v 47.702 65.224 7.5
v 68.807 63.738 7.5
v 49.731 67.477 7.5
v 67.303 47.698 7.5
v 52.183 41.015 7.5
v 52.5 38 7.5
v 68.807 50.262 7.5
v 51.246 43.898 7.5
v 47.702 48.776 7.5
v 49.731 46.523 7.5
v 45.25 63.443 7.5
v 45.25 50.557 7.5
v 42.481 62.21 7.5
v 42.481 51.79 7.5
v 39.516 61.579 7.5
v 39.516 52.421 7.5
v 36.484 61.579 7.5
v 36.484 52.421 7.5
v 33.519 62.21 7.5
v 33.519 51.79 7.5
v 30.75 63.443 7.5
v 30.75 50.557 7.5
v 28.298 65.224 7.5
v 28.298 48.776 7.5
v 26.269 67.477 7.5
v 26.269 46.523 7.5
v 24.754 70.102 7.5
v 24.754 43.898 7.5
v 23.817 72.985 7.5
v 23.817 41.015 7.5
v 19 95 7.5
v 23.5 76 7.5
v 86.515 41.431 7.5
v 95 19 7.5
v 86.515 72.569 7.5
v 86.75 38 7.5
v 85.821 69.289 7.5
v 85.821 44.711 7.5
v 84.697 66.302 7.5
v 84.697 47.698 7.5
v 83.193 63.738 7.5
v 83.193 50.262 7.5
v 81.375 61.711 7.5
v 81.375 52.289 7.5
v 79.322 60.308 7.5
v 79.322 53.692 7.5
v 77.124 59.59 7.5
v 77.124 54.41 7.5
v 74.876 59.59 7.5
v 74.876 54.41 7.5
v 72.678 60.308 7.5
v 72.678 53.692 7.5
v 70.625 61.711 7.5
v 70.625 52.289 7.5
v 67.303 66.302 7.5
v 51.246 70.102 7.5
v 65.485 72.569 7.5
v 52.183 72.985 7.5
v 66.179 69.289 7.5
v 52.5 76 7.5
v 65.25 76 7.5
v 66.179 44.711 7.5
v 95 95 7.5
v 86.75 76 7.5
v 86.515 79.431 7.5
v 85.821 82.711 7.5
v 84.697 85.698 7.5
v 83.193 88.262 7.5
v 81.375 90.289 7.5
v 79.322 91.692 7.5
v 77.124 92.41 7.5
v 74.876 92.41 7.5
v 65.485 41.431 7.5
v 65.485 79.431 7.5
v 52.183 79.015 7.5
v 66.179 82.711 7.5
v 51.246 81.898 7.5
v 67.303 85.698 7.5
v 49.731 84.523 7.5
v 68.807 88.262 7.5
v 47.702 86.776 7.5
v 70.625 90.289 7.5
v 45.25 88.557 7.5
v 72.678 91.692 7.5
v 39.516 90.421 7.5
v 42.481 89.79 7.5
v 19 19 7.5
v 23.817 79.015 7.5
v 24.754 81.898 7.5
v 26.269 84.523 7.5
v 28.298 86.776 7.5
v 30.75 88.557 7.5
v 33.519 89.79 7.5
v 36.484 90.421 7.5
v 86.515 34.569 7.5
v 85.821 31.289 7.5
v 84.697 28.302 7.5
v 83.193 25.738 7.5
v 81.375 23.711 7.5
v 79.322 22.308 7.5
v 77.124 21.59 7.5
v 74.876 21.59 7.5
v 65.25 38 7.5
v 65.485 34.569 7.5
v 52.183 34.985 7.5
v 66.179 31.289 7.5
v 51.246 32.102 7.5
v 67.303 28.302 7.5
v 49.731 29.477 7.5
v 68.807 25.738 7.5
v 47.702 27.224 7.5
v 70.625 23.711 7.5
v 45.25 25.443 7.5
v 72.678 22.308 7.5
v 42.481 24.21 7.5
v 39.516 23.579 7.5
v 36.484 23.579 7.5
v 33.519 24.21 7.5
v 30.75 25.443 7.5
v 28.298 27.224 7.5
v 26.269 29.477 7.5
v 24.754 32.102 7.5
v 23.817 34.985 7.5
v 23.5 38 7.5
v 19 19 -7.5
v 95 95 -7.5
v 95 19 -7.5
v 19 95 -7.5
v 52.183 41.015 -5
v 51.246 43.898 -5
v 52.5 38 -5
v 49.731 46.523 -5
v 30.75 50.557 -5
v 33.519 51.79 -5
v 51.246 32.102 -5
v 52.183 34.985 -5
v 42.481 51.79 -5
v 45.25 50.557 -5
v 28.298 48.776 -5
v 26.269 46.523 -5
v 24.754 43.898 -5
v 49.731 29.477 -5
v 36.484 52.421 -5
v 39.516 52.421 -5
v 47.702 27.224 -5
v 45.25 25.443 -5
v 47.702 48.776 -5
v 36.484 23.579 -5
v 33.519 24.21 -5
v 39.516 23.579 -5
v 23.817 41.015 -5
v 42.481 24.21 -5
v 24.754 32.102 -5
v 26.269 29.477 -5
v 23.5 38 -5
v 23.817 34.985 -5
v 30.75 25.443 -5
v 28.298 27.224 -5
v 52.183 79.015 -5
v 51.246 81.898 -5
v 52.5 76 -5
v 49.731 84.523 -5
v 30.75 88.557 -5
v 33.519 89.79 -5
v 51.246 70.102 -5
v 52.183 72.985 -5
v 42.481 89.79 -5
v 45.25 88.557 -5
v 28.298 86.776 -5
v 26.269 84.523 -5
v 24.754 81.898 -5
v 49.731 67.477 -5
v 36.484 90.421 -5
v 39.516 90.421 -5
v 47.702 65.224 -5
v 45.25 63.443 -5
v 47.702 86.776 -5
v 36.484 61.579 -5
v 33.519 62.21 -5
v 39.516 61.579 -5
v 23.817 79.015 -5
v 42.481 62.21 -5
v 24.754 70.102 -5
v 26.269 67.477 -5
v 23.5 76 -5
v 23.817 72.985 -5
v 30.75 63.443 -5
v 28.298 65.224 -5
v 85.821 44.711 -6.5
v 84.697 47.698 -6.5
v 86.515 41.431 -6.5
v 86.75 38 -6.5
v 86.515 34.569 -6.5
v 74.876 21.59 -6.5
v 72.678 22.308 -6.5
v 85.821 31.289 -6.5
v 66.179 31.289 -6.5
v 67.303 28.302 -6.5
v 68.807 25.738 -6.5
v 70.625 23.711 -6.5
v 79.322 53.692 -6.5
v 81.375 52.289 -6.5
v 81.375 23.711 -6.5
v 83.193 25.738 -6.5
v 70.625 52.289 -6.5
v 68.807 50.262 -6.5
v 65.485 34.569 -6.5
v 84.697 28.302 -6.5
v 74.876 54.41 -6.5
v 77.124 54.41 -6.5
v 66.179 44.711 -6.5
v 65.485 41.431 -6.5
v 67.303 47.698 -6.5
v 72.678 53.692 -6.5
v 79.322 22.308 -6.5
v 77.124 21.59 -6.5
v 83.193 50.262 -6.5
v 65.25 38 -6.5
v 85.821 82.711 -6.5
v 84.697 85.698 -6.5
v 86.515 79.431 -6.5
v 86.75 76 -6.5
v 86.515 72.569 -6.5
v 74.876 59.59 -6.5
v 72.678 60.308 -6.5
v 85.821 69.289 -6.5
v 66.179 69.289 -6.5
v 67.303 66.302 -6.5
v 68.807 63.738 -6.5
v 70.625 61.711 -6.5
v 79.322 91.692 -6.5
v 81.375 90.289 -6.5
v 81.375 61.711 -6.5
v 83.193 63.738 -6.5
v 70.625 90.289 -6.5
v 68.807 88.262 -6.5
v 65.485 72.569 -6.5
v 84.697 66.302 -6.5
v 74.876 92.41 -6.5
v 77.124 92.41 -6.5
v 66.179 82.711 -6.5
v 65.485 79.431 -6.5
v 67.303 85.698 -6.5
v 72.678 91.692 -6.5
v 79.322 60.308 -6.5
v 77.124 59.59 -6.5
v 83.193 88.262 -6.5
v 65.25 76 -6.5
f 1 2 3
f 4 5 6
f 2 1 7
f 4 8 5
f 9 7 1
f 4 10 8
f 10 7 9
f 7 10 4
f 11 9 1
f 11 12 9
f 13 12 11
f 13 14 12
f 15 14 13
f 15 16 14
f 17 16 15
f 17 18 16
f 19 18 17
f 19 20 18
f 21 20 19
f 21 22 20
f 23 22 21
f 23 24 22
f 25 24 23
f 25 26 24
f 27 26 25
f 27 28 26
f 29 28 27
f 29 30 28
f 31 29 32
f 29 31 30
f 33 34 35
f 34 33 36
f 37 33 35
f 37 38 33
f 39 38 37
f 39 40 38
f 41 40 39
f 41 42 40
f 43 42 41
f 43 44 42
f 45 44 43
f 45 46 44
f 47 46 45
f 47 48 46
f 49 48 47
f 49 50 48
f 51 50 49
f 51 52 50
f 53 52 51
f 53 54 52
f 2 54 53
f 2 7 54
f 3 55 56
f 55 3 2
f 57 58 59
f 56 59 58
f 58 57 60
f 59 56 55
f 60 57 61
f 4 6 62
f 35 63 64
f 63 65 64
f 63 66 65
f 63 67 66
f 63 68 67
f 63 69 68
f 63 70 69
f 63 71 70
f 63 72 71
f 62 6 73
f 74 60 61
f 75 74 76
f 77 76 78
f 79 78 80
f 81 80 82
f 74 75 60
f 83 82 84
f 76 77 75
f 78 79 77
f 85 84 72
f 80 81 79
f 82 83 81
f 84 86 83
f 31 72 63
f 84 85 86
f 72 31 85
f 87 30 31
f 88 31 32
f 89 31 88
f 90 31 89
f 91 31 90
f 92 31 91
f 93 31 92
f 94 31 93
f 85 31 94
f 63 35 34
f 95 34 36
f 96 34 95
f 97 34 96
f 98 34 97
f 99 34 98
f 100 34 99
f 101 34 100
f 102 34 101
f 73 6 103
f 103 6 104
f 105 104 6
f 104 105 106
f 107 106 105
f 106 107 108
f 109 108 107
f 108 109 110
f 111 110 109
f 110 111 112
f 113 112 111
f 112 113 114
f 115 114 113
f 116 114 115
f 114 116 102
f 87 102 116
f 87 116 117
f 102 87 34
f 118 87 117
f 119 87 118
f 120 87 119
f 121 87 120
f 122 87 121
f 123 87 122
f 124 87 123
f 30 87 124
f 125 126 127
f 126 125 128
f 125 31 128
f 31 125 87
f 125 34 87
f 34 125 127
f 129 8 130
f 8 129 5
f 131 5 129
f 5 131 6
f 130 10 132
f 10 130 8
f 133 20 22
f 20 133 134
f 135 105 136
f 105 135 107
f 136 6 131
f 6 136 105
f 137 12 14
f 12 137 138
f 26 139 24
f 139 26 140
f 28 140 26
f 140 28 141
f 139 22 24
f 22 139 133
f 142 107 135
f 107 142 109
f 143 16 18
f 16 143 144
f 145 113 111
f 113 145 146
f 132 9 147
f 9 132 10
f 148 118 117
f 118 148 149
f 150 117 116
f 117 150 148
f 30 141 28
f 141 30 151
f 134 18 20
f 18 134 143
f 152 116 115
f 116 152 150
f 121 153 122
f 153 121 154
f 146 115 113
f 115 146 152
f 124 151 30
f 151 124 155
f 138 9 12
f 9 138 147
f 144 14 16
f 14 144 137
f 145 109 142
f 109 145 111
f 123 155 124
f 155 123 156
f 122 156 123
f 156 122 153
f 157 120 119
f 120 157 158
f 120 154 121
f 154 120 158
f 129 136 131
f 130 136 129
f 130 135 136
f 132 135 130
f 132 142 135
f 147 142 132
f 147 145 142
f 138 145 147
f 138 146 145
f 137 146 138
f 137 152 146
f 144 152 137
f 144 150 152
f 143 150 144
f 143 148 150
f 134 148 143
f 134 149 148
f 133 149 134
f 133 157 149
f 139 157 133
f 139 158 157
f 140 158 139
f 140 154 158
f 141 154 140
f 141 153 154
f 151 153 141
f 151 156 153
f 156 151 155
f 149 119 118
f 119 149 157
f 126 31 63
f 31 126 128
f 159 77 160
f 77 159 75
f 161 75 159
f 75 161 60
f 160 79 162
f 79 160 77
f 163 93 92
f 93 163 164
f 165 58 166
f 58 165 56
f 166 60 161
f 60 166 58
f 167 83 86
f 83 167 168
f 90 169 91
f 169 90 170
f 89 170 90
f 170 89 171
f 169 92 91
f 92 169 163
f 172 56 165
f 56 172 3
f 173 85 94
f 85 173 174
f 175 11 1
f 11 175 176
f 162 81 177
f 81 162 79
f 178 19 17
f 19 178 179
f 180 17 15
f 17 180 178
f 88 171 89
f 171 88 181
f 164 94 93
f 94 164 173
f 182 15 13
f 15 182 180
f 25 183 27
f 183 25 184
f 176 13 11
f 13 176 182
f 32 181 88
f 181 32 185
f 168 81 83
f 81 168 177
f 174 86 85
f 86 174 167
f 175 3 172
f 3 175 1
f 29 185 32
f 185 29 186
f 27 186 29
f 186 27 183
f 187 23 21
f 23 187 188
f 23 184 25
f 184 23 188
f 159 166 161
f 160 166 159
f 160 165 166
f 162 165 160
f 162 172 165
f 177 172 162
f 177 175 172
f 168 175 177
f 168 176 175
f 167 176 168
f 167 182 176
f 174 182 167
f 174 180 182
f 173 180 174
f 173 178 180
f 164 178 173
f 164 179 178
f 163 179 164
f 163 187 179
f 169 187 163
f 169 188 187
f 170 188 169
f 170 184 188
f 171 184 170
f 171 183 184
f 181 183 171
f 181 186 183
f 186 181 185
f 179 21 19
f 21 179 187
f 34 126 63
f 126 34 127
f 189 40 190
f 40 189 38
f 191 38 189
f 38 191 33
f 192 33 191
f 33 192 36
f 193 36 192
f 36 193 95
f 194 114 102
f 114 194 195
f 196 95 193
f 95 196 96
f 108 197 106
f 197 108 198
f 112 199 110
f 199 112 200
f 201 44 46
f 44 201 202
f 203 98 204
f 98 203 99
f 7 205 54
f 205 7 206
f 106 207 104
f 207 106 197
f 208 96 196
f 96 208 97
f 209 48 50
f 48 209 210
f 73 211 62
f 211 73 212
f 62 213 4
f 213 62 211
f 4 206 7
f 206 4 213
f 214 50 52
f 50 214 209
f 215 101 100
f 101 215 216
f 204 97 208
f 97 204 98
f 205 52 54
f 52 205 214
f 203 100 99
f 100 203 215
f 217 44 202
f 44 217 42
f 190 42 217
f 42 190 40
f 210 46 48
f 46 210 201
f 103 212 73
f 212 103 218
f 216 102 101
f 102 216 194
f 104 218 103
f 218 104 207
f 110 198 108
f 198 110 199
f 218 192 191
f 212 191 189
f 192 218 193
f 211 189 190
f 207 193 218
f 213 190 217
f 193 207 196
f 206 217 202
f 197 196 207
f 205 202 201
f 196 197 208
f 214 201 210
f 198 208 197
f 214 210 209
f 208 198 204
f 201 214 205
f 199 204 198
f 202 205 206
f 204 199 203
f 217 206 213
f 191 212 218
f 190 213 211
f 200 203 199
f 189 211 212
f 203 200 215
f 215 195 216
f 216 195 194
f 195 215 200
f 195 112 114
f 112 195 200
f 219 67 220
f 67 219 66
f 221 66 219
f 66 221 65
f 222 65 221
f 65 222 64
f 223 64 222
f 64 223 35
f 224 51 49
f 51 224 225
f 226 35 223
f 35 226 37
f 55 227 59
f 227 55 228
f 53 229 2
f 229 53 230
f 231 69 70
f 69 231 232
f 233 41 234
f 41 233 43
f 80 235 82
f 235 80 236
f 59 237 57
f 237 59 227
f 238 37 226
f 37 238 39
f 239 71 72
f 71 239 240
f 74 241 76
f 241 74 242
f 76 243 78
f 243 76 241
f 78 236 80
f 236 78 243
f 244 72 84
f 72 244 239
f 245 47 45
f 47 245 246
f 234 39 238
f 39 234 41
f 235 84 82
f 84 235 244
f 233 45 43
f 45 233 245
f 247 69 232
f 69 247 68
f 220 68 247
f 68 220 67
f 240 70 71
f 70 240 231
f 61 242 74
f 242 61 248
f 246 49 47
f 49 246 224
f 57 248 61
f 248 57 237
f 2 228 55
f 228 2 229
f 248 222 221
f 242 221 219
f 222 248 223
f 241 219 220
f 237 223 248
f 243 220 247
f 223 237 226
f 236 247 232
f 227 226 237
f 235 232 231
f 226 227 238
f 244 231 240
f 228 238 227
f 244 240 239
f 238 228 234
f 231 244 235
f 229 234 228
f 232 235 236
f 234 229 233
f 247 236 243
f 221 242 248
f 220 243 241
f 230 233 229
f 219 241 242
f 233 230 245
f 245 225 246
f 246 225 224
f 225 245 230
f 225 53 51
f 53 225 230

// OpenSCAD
itens_per_line = 2;
z_size = 15;
colorama_lines = [2];
risque_lines   = [1];
num_x = len(colorama_lines) + len(risque_lines);

for(x = [1 : 1 :num_x])
{
    for( y = [1 : 1 : itens_per_line])
    {     
        for ( z = [0 : 1 : len(colorama_lines)])
        {           
            if ( colorama_lines[z] == x )
            {                
                 colorama((38*x),(38*y));              
            }
        }
        
        for ( z = [0 : 1 : len(risque_lines)])
        {           
            if ( risque_lines[z] == x )
            {                
                 risque((38*x),(38*y));
            }
        }
    }
  
}




module colorama(x,y)
{
    translate([x,y,0]){
        difference(){
            translate([0,0,0])
                cube([38,38,z_size],center=true);
            translate([0,0,1])
                oval(21.5,33,z_size,true);
        }
    }   
}

module risque(x,y)
{
      translate([x,y,0]){
        difference(){
            translate([0,0,0])
                cube([38,38,z_size],center=true);
            translate([0,0,10])
                cylinder(30,29/2,29/2,true);
        }
    }   
}
module oval(w,h, height, center = false) { 
    h = h/2;
    w = w/2;
  scale([1, h/w, 1]) cylinder(h=height, r=w, center=center); 
 } 
